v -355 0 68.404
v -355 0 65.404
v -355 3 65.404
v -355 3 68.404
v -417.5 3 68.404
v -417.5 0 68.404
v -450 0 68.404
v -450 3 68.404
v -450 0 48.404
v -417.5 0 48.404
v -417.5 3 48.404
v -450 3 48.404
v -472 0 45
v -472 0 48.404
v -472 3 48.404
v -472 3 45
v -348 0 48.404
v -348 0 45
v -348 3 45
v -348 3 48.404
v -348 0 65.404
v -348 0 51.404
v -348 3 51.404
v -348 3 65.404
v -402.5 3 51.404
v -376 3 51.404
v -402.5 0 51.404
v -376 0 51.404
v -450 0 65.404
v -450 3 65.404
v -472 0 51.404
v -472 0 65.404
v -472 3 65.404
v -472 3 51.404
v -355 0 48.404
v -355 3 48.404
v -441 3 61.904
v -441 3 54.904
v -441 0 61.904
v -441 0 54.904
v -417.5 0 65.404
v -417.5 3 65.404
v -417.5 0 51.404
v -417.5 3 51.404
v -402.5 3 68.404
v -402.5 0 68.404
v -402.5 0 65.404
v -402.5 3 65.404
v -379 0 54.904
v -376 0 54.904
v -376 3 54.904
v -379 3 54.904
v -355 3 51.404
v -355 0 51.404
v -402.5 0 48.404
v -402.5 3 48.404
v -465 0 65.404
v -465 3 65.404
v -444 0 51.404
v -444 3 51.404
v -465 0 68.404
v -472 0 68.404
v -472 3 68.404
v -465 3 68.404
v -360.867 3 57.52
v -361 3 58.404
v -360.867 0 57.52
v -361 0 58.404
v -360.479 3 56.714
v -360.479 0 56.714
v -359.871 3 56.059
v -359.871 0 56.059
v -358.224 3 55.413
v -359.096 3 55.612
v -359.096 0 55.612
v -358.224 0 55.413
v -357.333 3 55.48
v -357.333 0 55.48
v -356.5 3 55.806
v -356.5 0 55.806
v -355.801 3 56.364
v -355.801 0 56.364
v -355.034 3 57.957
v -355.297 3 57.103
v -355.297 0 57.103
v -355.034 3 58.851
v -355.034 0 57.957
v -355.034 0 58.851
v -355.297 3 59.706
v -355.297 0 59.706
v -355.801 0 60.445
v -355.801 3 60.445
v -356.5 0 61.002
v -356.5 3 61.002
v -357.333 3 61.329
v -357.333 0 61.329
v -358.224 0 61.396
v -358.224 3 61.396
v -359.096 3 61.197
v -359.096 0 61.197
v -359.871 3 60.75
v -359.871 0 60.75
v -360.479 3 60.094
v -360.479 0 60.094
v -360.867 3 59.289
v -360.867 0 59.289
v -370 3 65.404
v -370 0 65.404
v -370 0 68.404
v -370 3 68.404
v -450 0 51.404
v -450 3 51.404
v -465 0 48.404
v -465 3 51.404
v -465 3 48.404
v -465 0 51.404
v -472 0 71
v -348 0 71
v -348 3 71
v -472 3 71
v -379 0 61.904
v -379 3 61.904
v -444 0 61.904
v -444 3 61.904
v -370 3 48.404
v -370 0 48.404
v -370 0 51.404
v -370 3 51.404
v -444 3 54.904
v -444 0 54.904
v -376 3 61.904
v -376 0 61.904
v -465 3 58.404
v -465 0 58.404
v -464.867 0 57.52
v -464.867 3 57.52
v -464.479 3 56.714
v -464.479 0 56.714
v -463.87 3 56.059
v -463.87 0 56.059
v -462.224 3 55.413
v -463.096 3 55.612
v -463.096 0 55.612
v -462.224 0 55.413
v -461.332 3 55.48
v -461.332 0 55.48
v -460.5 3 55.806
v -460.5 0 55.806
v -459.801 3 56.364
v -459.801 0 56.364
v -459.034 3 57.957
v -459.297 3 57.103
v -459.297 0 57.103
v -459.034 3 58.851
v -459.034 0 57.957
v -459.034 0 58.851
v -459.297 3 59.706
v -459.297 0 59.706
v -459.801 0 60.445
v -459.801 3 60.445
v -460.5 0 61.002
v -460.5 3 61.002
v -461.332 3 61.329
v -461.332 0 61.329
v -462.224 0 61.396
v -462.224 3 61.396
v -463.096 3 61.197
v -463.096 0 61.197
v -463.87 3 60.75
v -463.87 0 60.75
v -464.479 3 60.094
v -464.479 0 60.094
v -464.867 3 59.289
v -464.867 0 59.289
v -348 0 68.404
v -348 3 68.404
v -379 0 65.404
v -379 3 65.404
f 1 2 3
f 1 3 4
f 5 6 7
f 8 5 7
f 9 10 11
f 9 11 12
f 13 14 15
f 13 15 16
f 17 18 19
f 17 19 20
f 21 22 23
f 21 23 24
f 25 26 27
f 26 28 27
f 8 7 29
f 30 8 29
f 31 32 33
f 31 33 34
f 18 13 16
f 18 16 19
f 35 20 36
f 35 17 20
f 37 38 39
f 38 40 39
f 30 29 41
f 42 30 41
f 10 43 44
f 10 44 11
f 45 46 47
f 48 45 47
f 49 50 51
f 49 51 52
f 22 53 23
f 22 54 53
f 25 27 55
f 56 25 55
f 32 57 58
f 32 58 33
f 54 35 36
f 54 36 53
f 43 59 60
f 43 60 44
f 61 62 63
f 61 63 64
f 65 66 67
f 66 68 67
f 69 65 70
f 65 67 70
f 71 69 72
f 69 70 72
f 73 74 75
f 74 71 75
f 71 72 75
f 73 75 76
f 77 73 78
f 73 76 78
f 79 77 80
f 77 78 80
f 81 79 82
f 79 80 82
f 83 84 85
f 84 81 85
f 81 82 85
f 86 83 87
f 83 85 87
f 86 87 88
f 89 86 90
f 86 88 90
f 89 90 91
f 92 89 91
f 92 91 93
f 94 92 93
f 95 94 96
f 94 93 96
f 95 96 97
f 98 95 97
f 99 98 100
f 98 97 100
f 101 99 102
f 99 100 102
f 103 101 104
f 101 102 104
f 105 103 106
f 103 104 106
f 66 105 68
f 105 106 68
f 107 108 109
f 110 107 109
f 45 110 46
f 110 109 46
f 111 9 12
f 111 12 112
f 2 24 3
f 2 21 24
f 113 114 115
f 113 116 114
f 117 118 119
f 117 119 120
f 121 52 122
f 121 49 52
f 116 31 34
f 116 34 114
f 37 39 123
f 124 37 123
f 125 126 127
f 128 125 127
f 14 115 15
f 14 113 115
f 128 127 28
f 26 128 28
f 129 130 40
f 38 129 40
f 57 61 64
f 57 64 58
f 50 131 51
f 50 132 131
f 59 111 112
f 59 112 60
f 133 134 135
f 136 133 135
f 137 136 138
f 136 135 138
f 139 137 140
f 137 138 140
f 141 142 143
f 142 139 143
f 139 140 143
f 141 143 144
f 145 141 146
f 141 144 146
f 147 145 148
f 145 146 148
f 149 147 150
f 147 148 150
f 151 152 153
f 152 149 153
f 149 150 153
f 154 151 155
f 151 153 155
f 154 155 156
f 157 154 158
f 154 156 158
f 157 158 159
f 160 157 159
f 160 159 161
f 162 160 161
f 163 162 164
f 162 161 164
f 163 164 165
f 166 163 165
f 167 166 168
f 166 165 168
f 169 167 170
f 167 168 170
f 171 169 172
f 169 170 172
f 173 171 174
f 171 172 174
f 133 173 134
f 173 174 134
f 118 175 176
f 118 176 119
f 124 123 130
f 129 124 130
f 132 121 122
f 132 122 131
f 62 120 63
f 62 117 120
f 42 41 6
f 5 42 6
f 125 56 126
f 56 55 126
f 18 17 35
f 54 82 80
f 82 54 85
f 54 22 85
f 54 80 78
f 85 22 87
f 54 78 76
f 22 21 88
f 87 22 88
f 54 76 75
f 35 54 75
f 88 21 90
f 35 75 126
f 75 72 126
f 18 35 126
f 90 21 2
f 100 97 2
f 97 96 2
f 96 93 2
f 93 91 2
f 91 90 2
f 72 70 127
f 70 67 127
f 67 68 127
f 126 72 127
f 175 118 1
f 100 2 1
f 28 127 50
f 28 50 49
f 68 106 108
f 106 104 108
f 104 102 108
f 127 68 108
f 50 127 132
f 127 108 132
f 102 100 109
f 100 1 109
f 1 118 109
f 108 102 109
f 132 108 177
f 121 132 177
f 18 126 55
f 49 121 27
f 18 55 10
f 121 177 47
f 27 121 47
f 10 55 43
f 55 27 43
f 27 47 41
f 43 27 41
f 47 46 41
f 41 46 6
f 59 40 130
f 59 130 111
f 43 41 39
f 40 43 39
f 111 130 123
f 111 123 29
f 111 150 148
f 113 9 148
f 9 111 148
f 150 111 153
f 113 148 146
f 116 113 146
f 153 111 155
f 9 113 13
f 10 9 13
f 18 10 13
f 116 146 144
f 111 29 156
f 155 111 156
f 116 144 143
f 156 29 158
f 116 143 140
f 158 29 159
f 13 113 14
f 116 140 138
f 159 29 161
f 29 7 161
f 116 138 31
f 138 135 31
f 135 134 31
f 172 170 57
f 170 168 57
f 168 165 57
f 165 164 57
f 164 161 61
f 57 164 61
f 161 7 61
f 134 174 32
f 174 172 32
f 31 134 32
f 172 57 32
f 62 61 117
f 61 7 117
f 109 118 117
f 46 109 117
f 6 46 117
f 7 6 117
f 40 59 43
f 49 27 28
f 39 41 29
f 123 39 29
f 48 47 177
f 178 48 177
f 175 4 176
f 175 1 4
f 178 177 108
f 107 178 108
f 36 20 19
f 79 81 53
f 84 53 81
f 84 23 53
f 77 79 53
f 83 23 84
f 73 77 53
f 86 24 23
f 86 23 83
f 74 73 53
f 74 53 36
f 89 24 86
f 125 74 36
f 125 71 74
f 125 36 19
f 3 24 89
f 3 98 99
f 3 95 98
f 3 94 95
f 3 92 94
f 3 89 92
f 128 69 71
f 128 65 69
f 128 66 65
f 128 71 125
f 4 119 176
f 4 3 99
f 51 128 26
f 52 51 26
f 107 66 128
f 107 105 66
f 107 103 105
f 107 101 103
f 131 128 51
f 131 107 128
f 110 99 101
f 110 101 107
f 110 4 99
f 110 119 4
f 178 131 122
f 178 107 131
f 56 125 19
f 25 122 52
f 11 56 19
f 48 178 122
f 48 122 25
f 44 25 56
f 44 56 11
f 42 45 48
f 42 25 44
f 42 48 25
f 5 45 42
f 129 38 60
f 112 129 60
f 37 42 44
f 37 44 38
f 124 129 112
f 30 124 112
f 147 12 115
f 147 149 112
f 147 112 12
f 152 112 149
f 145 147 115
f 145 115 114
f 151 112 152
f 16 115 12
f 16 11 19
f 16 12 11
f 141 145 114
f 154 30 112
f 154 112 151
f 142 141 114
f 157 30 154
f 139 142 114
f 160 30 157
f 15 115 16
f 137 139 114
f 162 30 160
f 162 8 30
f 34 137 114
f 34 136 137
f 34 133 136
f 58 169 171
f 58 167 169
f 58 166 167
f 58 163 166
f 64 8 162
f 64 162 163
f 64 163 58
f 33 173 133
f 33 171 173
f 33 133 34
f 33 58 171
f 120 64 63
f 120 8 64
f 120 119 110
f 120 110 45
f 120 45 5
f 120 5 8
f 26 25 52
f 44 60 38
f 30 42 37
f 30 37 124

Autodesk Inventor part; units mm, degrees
ref_plane "YZ Plane" through (0, 0, 0) normal (1, 0, 0) x (0, 1, 0)
ref_plane "XZ Plane" through (0, 0, 0) normal (0, 1, 0) x (-1, 0, 0)
ref_plane "XY Plane" through (0, 0, 0) normal (0, 0, 1) x (1, 0, 0)
sketch "Sketch2" plane through (0, 0, 0) normal (0, 1, 0) x (-1, 0, 0)
  line L0 (600, 68.7059) -> (634, 68.7059)
  arc A0 (642, 60.7059) -> (634, 68.7059) centre (634, 60.7059) ccw
  line L1 (642, 60.7059) -> (642, 56.7059)
  arc A1 (634, 48.7059) -> (642, 56.7059) centre (634, 56.7059) ccw
  line L2 (634, 48.7059) -> (632, 48.7059)
  arc A2 (632, 48.7059) -> (624, 40.7059) centre (632, 40.7059) ccw
  line L3 (624, 40.7059) -> (624, 36.7059)
  arc A3 (624, 36.7059) -> (632, 28.7059) centre (632, 36.7059) ccw
  line L4 (632, 28.7059) -> (634, 28.7059)
  arc A4 (642, 20.7059) -> (634, 28.7059) centre (634, 20.7059) ccw
  line L5 (642, 20.7059) -> (642, 16.7059)
  arc A5 (634, 8.7059) -> (642, 16.7059) centre (634, 16.7059) ccw
  line L6 (634, 8.7059) -> (600, 8.7059)
  arc A6 (592, 16.7059) -> (600, 8.7059) centre (600, 16.7059) ccw
  line L7 (592, 16.7059) -> (592, 21.7059)
  line L8 (592, 21.7059) -> (606.1716, 35.8774)
  arc A7 (606.1716, 35.8774) -> (606.1716, 41.5343) centre (603.3431, 38.7059) ccw
  line L9 (606.1716, -97.5343) -> (592, -111.7059)
  line L10 (592, -111.7059) -> (592, -116.7059)
  arc A8 (592, -116.7059) -> (600, -124.7059) centre (600, -116.7059) ccw
  line L11 (600, -124.7059) -> (634, -124.7059)
  arc A9 (634, -124.7059) -> (642, -116.7059) centre (634, -116.7059) ccw
  line L12 (642, -116.7059) -> (642, -112.7059)
  arc A10 (642, -112.7059) -> (634, -104.7059) centre (634, -112.7059) ccw
  line L13 (634, -104.7059) -> (632, -104.7059)
  arc A11 (624, -96.7059) -> (632, -104.7059) centre (632, -96.7059) ccw
  line L14 (624, -96.7059) -> (624, -92.7059)
  arc A12 (632, -84.7059) -> (624, -92.7059) centre (632, -92.7059) ccw
  line L15 (632, -84.7059) -> (634, -84.7059)
  arc A13 (634, -84.7059) -> (642, -76.7059) centre (634, -76.7059) ccw
  line L16 (642, -76.7059) -> (642, -72.7059)
  arc A14 (642, -72.7059) -> (634, -64.7059) centre (634, -72.7059) ccw
  line L17 (634, -64.7059) -> (600, -64.7059)
  arc A15 (600, -64.7059) -> (592, -72.7059) centre (600, -72.7059) ccw
  line L18 (592, -72.7059) -> (592, -77.7059)
  line L19 (592, -77.7059) -> (606.1716, -91.8774)
  arc A16 (606.1716, -97.5343) -> (606.1716, -91.8774) centre (603.3431, -94.7059) ccw
  circle A17 centre (618, -74.7059) radius 3
  circle A18 centre (634, -74.7059) radius 3
  circle A19 centre (634, -114.7059) radius 3
  circle A20 centre (618, -114.7059) radius 3
  circle A21 centre (618, 58.7059) radius 3
  circle A22 centre (634, 58.7059) radius 3
  circle A23 centre (634, 18.7059) radius 3
  circle A24 centre (618, 18.7059) radius 3
  line L20 (606.1716, 41.5343) -> (592, 55.7059)
  line L21 (592, 55.7059) -> (592, 60.7059)
  arc A25 (600, 68.7059) -> (592, 60.7059) centre (600, 60.7059) ccw
  line L22 (329, -137) -> (729, -137)
  line L23 (729, -137) -> (729, 83)
  line L24 (729, 83) -> (329, 83)
  line L25 (329, 83) -> (329, -137)
  line L26 (444, -107.4043) -> (417.5, -107.4043)
  line L27 (417.5, -107.4043) -> (417.5, -104.4043)
  line L28 (417.5, -104.4043) -> (450, -104.4043)
  line L29 (450, -104.4043) -> (450, -107.4043)
  line L30 (450, -107.4043) -> (444, -107.4043)
  line L31 (441, -117.9043) -> (444, -117.9043)
  line L32 (444, -117.9043) -> (444, -110.9043)
  line L33 (444, -110.9043) -> (441, -110.9043)
  line L34 (441, -110.9043) -> (441, -117.9043)
  line L35 (417.5, -121.4043) -> (417.5, -124.4043)
  line L36 (417.5, -124.4043) -> (450, -124.4043)
  line L37 (450, -124.4043) -> (450, -121.4043)
  line L38 (450, -121.4043) -> (417.5, -121.4043)
  line L39 (376.0002, -107.4043) -> (402.5, -107.4043)
  line L40 (402.5, -107.4043) -> (402.5, -104.4043)
  line L41 (402.5, -104.4043) -> (370, -104.4043)
  line L42 (370, -104.4043) -> (370, -107.4043)
  line L43 (370, -107.4043) -> (376.0002, -107.4043)
  line L44 (379.0002, -121.4043) -> (370, -121.4043)
  line L45 (370, -121.4043) -> (370, -124.4043)
  line L46 (370, -124.4043) -> (402.5, -124.4043)
  line L47 (402.5, -124.4043) -> (402.5, -121.4043)
  line L48 (402.5, -121.4043) -> (379.0002, -121.4043)
  line L49 (379.0002, -117.9043) -> (376.0002, -117.9043)
  line L50 (376.0002, -117.9043) -> (376.0002, -110.9043)
  line L51 (376.0002, -110.9043) -> (379.0002, -110.9043)
  line L52 (379.0002, -110.9043) -> (379.0002, -117.9043)
  line L53 (348, -127) -> (472.0002, -127)
  line L54 (472.0002, -127) -> (472.0002, -124.4043)
  line L55 (472.0002, -124.4043) -> (465, -124.4043)
  line L56 (465, -124.4043) -> (465, -121.4043)
  line L57 (465, -121.4043) -> (472.0002, -121.4043)
  line L58 (472.0002, -121.4043) -> (472.0002, -107.4043)
  line L59 (472.0002, -107.4043) -> (465, -107.4043)
  line L60 (465, -107.4043) -> (465, -104.4043)
  line L61 (465, -104.4043) -> (472.0002, -104.4043)
  line L62 (472.0002, -104.4043) -> (472.0002, -101)
  line L63 (472.0002, -101) -> (348, -101)
  line L64 (348, -101) -> (348, -104.4043)
  line L65 (348, -104.4043) -> (355, -104.4043)
  line L66 (355, -104.4043) -> (355, -107.4043)
  line L67 (355, -107.4043) -> (348, -107.4043)
  line L68 (348, -107.4043) -> (348, -121.4043)
  line L69 (348, -121.4043) -> (355, -121.4043)
  line L70 (355, -121.4043) -> (355, -124.4043)
  line L71 (355, -124.4043) -> (348, -124.4043)
  line L72 (348, -124.4043) -> (348, -127)
  circle A26 centre (447.7252, -37.7011) radius 3
  circle A27 centre (372.2748, -37.7011) radius 3
  circle A28 centre (410, -64.4043) radius 3
  circle A29 centre (448.5, -66.4043) radius 3
  circle A30 centre (371.5, -66.4043) radius 3
  circle A31 centre (410, -80.4043) radius 3
  line L73 (379, -84.4043) -> (376, -84.4043)
  line L74 (376, -84.4043) -> (376, -74.4043)
  line L75 (376, -74.4043) -> (379, -74.4043)
  line L76 (379, -74.4043) -> (379, -84.4043)
  line L77 (379, -57.4043) -> (376, -57.4043)
  line L78 (376, -57.4043) -> (376, -47.4043)
  line L79 (376, -47.4043) -> (379, -47.4043)
  line L80 (379, -47.4043) -> (379, -57.4043)
  line L81 (441, -47.4043) -> (441, -57.4043)
  line L82 (441, -57.4043) -> (444, -57.4043)
  line L83 (444, -57.4043) -> (444, -47.4043)
  line L84 (444, -47.4043) -> (441, -47.4043)
  line L85 (441, -74.4043) -> (441, -84.4043)
  line L86 (441, -84.4043) -> (444, -84.4043)
  line L87 (444, -84.4043) -> (444, -74.4043)
  line L88 (444, -74.4043) -> (441, -74.4043)
  line L89 (427, -44.4043) -> (427, -72.4043)
  arc A32 (427, -72.4043) -> (433, -72.4043) centre (430, -72.4043) ccw
  line L90 (433, -72.4043) -> (433, -44.4043)
  arc A33 (433, -44.4043) -> (427, -44.4043) centre (430, -44.4043) ccw
  arc A34 (387, -72.4043) -> (393, -72.4043) centre (390, -72.4043) ccw
  line L91 (393, -72.4043) -> (393, -44.4043)
  arc A35 (393, -44.4043) -> (387, -44.4043) centre (390, -44.4043) ccw
  line L92 (387, -44.4043) -> (387, -72.4043)
  line L93 (372.3983, -27.7019) -> (383.2576, -27.7018)
  arc A36 (390.8984, -33.3311) -> (383.2576, -27.7018) centre (383.2577, -35.7018) ccw
  arc A37 (390.8984, -33.3311) -> (429.1018, -33.3307) centre (410, -27.4043) ccw
  arc A38 (436.7424, -27.7012) -> (429.1018, -33.3307) centre (436.7425, -35.7012) ccw
  line L94 (436.7424, -27.7012) -> (447.7251, -27.7011)
  arc A39 (457.0715, -34.1449) -> (447.7251, -27.7011) centre (447.7252, -37.7011) ccw
  line L95 (457.0715, -34.1449) -> (477.9368, -88.9818)
  arc A40 (474.1982, -94.4043) -> (477.9368, -88.9818) centre (474.1982, -90.4043) ccw
  line L96 (474.1982, -94.4043) -> (465, -94.4043)
  line L97 (465, -94.4043) -> (465, -91.4043)
  line L98 (465, -91.4043) -> (450, -91.4043)
  line L99 (450, -91.4043) -> (450, -94.4043)
  line L100 (450, -94.4043) -> (417.5, -94.4043)
  line L101 (417.5, -94.4043) -> (417.5, -91.4043)
  line L102 (417.5, -91.4043) -> (402.5, -91.4043)
  line L103 (402.5, -91.4043) -> (402.5, -94.4043)
  line L104 (402.5, -94.4043) -> (370, -94.4043)
  line L105 (370, -94.4043) -> (370, -91.4043)
  line L106 (370, -91.4043) -> (355, -91.4043)
  line L107 (355, -91.4043) -> (355, -94.4043)
  line L108 (355, -94.4043) -> (345.8018, -94.4043)
  arc A41 (342.0632, -88.9818) -> (345.8018, -94.4043) centre (345.8018, -90.4043) ccw
  line L109 (342.0632, -88.9818) -> (362.9285, -34.1449)
  arc A42 (372.3983, -27.7019) -> (362.9285, -34.1449) centre (372.2748, -37.7011) ccw
  line L110 (491.3983, -95.7004) -> (502.2576, -95.7005)
  arc A43 (502.2576, -95.7005) -> (509.8984, -90.0712) centre (502.2577, -87.7005) ccw
  arc A44 (548.1018, -90.0716) -> (509.8984, -90.0712) centre (529, -95.998) ccw
  arc A45 (548.1018, -90.0716) -> (555.7424, -95.701) centre (555.7425, -87.701) ccw
  line L111 (555.7424, -95.701) -> (566.7251, -95.7011)
  arc A46 (566.7251, -95.7011) -> (576.0715, -89.2574) centre (566.7252, -85.7011) ccw
  line L112 (576.0715, -89.2574) -> (596.9368, -34.4205)
  arc A47 (596.9368, -34.4205) -> (593.1982, -28.998) centre (593.1982, -32.998) ccw
  line L113 (593.1982, -28.998) -> (584, -28.998)
  line L114 (584, -28.998) -> (584, -31.998)
  line L115 (584, -31.998) -> (569, -31.998)
  line L116 (569, -31.998) -> (569, -28.998)
  line L117 (569, -28.998) -> (536.5, -28.998)
  line L118 (536.5, -28.998) -> (536.5, -31.998)
  line L119 (536.5, -31.998) -> (521.5, -31.998)
  line L120 (521.5, -31.998) -> (521.5, -28.998)
  line L121 (521.5, -28.998) -> (489, -28.998)
  line L122 (489, -28.998) -> (489, -31.998)
  line L123 (489, -31.998) -> (474, -31.998)
  line L124 (474, -31.998) -> (474, -28.998)
  line L125 (474, -28.998) -> (464.8018, -28.998)
  arc A48 (464.8018, -28.998) -> (461.0632, -34.4205) centre (464.8018, -32.998) ccw
  line L126 (461.0632, -34.4205) -> (481.9285, -89.2574)
  arc A49 (481.9285, -89.2574) -> (491.3983, -95.7004) centre (491.2748, -85.7011) ccw
  arc A50 (512, -50.998) -> (506, -50.998) centre (509, -50.998) ccw
  line L127 (512, -50.998) -> (512, -78.998)
  arc A51 (506, -78.998) -> (512, -78.998) centre (509, -78.998) ccw
  line L128 (506, -78.998) -> (506, -50.998)
  line L129 (546, -78.998) -> (546, -50.998)
  arc A52 (552, -50.998) -> (546, -50.998) centre (549, -50.998) ccw
  line L130 (552, -50.998) -> (552, -78.998)
  arc A53 (546, -78.998) -> (552, -78.998) centre (549, -78.998) ccw
  line L131 (560, -48.998) -> (560, -38.998)
  line L132 (560, -38.998) -> (563, -38.998)
  line L133 (563, -38.998) -> (563, -48.998)
  line L134 (563, -48.998) -> (560, -48.998)
  line L135 (560, -75.998) -> (560, -65.998)
  line L136 (560, -65.998) -> (563, -65.998)
  line L137 (563, -65.998) -> (563, -75.998)
  line L138 (563, -75.998) -> (560, -75.998)
  line L139 (498, -65.998) -> (495, -65.998)
  line L140 (495, -65.998) -> (495, -75.998)
  line L141 (495, -75.998) -> (498, -75.998)
  line L142 (498, -75.998) -> (498, -65.998)
  line L143 (498, -38.998) -> (495, -38.998)
  line L144 (495, -38.998) -> (495, -48.998)
  line L145 (495, -48.998) -> (498, -48.998)
  line L146 (498, -48.998) -> (498, -38.998)
  circle A54 centre (529, -42.998) radius 3
  circle A55 centre (490.5, -56.998) radius 3
  circle A56 centre (567.5, -56.998) radius 3
  circle A57 centre (529, -58.998) radius 3
  circle A58 centre (491.2748, -85.7011) radius 3
  circle A59 centre (566.7252, -85.7011) radius 3
  circle A60 centre (462, -114.4043) radius 3
  circle A61 centre (358.0002, -114.4043) radius 3
  line L147 (578, -104.4043) -> (578, -107.4043)
  line L148 (578, -107.4043) -> (585, -107.4043)
  line L149 (585, -107.4043) -> (585, -110.9043)
  line L150 (585, -110.9043) -> (588, -110.9043)
  line L151 (588, -110.9043) -> (588, -117.9043)
  line L152 (588, -117.9043) -> (585, -117.9043)
  line L153 (585, -117.9043) -> (585, -121.4043)
  line L154 (585, -121.4043) -> (578, -121.4043)
  line L155 (578, -121.4043) -> (578, -124.4043)
  line L156 (578, -124.4043) -> (568, -124.4043)
  line L157 (568, -124.4043) -> (568, -121.4043)
  line L158 (568, -121.4043) -> (551, -121.4043)
  line L159 (551, -121.4043) -> (551, -124.4043)
  line L160 (551, -124.4043) -> (541, -124.4043)
  line L161 (541, -124.4043) -> (541, -121.4043)
  line L162 (541, -121.4043) -> (535, -121.4043)
  line L163 (535, -121.4043) -> (535, -107.4043)
  line L164 (535, -107.4043) -> (541, -107.4043)
  line L165 (541, -107.4043) -> (541, -104.4043)
  line L166 (541, -104.4043) -> (551, -104.4043)
  line L167 (551, -104.4043) -> (551, -107.4043)
  line L168 (551, -107.4043) -> (568, -107.4043)
  line L169 (568, -107.4043) -> (568, -104.4043)
  line L170 (568, -104.4043) -> (578, -104.4043)
  line L171 (520, -104.4043) -> (520, -107.4043)
  line L172 (520, -107.4043) -> (527, -107.4043)
  line L173 (527, -107.4043) -> (527, -110.9043)
  line L174 (527, -110.9043) -> (530, -110.9043)
  line L175 (530, -110.9043) -> (530, -117.9043)
  line L176 (530, -117.9043) -> (527, -117.9043)
  line L177 (527, -117.9043) -> (527, -121.4043)
  line L178 (527, -121.4043) -> (520, -121.4043)
  line L179 (520, -121.4043) -> (520, -124.4043)
  line L180 (520, -124.4043) -> (510, -124.4043)
  line L181 (510, -124.4043) -> (510, -121.4043)
  line L182 (510, -121.4043) -> (493, -121.4043)
  line L183 (493, -121.4043) -> (493, -124.4043)
  line L184 (493, -124.4043) -> (483, -124.4043)
  line L185 (483, -124.4043) -> (483, -121.4043)
  line L186 (483, -121.4043) -> (477, -121.4043)
  line L187 (477, -121.4043) -> (477, -107.4043)
  line L188 (477, -107.4043) -> (483, -107.4043)
  line L189 (483, -107.4043) -> (483, -104.4043)
  line L190 (483, -104.4043) -> (493, -104.4043)
  line L191 (493, -104.4043) -> (493, -107.4043)
  line L192 (493, -107.4043) -> (510, -107.4043)
  line L193 (510, -107.4043) -> (510, -104.4043)
  line L194 (510, -104.4043) -> (520, -104.4043)
  line L195 (520, 48.4043) -> (520, 51.4043)
  line L196 (520, 51.4043) -> (527, 51.4043)
  line L197 (527, 51.4043) -> (527, 54.9043)
  line L198 (527, 54.9043) -> (530, 54.9043)
  line L199 (530, 54.9043) -> (530, 61.9043)
  line L200 (530, 61.9043) -> (527, 61.9043)
  line L201 (527, 61.9043) -> (527, 65.4043)
  line L202 (527, 65.4043) -> (520, 65.4043)
  line L203 (520, 65.4043) -> (520, 68.4043)
  line L204 (520, 68.4043) -> (510, 68.4043)
  line L205 (510, 68.4043) -> (510, 65.4043)
  line L206 (510, 65.4043) -> (493, 65.4043)
  line L207 (493, 65.4043) -> (493, 68.4043)
  line L208 (493, 68.4043) -> (483, 68.4043)
  line L209 (483, 68.4043) -> (483, 65.4043)
  line L210 (483, 65.4043) -> (477, 65.4043)
  line L211 (477, 65.4043) -> (477, 51.4043)
  line L212 (477, 51.4043) -> (483, 51.4043)
  line L213 (483, 51.4043) -> (483, 48.4043)
  line L214 (483, 48.4043) -> (493, 48.4043)
  line L215 (493, 48.4043) -> (493, 51.4043)
  line L216 (493, 51.4043) -> (510, 51.4043)
  line L217 (510, 51.4043) -> (510, 48.4043)
  line L218 (510, 48.4043) -> (520, 48.4043)
  line L219 (578, 48.4043) -> (578, 51.4043)
  line L220 (578, 51.4043) -> (585, 51.4043)
  line L221 (585, 51.4043) -> (585, 54.9043)
  line L222 (585, 54.9043) -> (588, 54.9043)
  line L223 (588, 54.9043) -> (588, 61.9043)
  line L224 (588, 61.9043) -> (585, 61.9043)
  line L225 (585, 61.9043) -> (585, 65.4043)
  line L226 (585, 65.4043) -> (578, 65.4043)
  line L227 (578, 65.4043) -> (578, 68.4043)
  line L228 (578, 68.4043) -> (568, 68.4043)
  line L229 (568, 68.4043) -> (568, 65.4043)
  line L230 (568, 65.4043) -> (551, 65.4043)
  line L231 (551, 65.4043) -> (551, 68.4043)
  line L232 (551, 68.4043) -> (541, 68.4043)
  line L233 (541, 68.4043) -> (541, 65.4043)
  line L234 (541, 65.4043) -> (535, 65.4043)
  line L235 (535, 65.4043) -> (535, 51.4043)
  line L236 (535, 51.4043) -> (541, 51.4043)
  line L237 (541, 51.4043) -> (541, 48.4043)
  line L238 (541, 48.4043) -> (551, 48.4043)
  line L239 (551, 48.4043) -> (551, 51.4043)
  line L240 (551, 51.4043) -> (568, 51.4043)
  line L241 (568, 51.4043) -> (568, 48.4043)
  line L242 (568, 48.4043) -> (578, 48.4043)
  circle A62 centre (358.0002, 58.4043) radius 3
  circle A63 centre (462, 58.4043) radius 3
  circle A64 centre (566.7252, 29.7011) radius 3
  circle A65 centre (491.2748, 29.7011) radius 3
  circle A66 centre (529, 2.998) radius 3
  circle A67 centre (567.5, 0.998) radius 3
  circle A68 centre (490.5, 0.998) radius 3
  circle A69 centre (529, -13.002) radius 3
  line L243 (498, -17.002) -> (495, -17.002)
  line L244 (495, -17.002) -> (495, -7.002)
  line L245 (495, -7.002) -> (498, -7.002)
  line L246 (498, -7.002) -> (498, -17.002)
  line L247 (498, 9.998) -> (495, 9.998)
  line L248 (495, 9.998) -> (495, 19.998)
  line L249 (495, 19.998) -> (498, 19.998)
  line L250 (498, 19.998) -> (498, 9.998)
  line L251 (560, 19.998) -> (560, 9.998)
  line L252 (560, 9.998) -> (563, 9.998)
  line L253 (563, 9.998) -> (563, 19.998)
  line L254 (563, 19.998) -> (560, 19.998)
  line L255 (560, -7.002) -> (560, -17.002)
  line L256 (560, -17.002) -> (563, -17.002)
  line L257 (563, -17.002) -> (563, -7.002)
  line L258 (563, -7.002) -> (560, -7.002)
  line L259 (546, 22.998) -> (546, -5.002)
  arc A70 (546, -5.002) -> (552, -5.002) centre (549, -5.002) ccw
  line L260 (552, -5.002) -> (552, 22.998)
  arc A71 (552, 22.998) -> (546, 22.998) centre (549, 22.998) ccw
  arc A72 (506, -5.002) -> (512, -5.002) centre (509, -5.002) ccw
  line L261 (512, -5.002) -> (512, 22.998)
  arc A73 (512, 22.998) -> (506, 22.998) centre (509, 22.998) ccw
  line L262 (506, 22.998) -> (506, -5.002)
  line L263 (491.3983, 39.7004) -> (502.2576, 39.7005)
  arc A74 (509.8984, 34.0712) -> (502.2576, 39.7005) centre (502.2577, 31.7005) ccw
  arc A75 (509.8984, 34.0712) -> (548.1018, 34.0716) centre (529, 39.998) ccw
  arc A76 (555.7424, 39.701) -> (548.1018, 34.0716) centre (555.7425, 31.701) ccw
  line L264 (555.7424, 39.701) -> (566.7251, 39.7011)
  arc A77 (576.0715, 33.2574) -> (566.7251, 39.7011) centre (566.7252, 29.7011) ccw
  line L265 (576.0715, 33.2574) -> (596.9368, -21.5795)
  arc A78 (593.1982, -27.002) -> (596.9368, -21.5795) centre (593.1982, -23.002) ccw
  line L266 (593.1982, -27.002) -> (584, -27.002)
  line L267 (584, -27.002) -> (584, -24.002)
  line L268 (584, -24.002) -> (569, -24.002)
  line L269 (569, -24.002) -> (569, -27.002)
  line L270 (569, -27.002) -> (536.5, -27.002)
  line L271 (536.5, -27.002) -> (536.5, -24.002)
  line L272 (536.5, -24.002) -> (521.5, -24.002)
  line L273 (521.5, -24.002) -> (521.5, -27.002)
  line L274 (521.5, -27.002) -> (489, -27.002)
  line L275 (489, -27.002) -> (489, -24.002)
  line L276 (489, -24.002) -> (474, -24.002)
  line L277 (474, -24.002) -> (474, -27.002)
  line L278 (474, -27.002) -> (464.8018, -27.002)
  arc A79 (461.0632, -21.5795) -> (464.8018, -27.002) centre (464.8018, -23.002) ccw
  line L279 (461.0632, -21.5795) -> (481.9285, 33.2574)
  arc A80 (491.3983, 39.7004) -> (481.9285, 33.2574) centre (491.2748, 29.7011) ccw
  line L280 (372.3983, -28.2981) -> (383.2576, -28.2982)
  arc A81 (383.2576, -28.2982) -> (390.8984, -22.6689) centre (383.2577, -20.2982) ccw
  arc A82 (429.1018, -22.6693) -> (390.8984, -22.6689) centre (410, -28.5957) ccw
  arc A83 (429.1018, -22.6693) -> (436.7424, -28.2988) centre (436.7425, -20.2988) ccw
  line L281 (436.7424, -28.2988) -> (447.7251, -28.2989)
  arc A84 (447.7251, -28.2989) -> (457.0715, -21.8551) centre (447.7252, -18.2989) ccw
  line L282 (457.0715, -21.8551) -> (477.9368, 32.9818)
  arc A85 (477.9368, 32.9818) -> (474.1982, 38.4043) centre (474.1982, 34.4043) ccw
  line L283 (474.1982, 38.4043) -> (465, 38.4043)
  line L284 (465, 38.4043) -> (465, 35.4043)
  line L285 (465, 35.4043) -> (450, 35.4043)
  line L286 (450, 35.4043) -> (450, 38.4043)
  line L287 (450, 38.4043) -> (417.5, 38.4043)
  line L288 (417.5, 38.4043) -> (417.5, 35.4043)
  line L289 (417.5, 35.4043) -> (402.5, 35.4043)
  line L290 (402.5, 35.4043) -> (402.5, 38.4043)
  line L291 (402.5, 38.4043) -> (370, 38.4043)
  line L292 (370, 38.4043) -> (370, 35.4043)
  line L293 (370, 35.4043) -> (355, 35.4043)
  line L294 (355, 35.4043) -> (355, 38.4043)
  line L295 (355, 38.4043) -> (345.8018, 38.4043)
  arc A86 (345.8018, 38.4043) -> (342.0632, 32.9818) centre (345.8018, 34.4043) ccw
  line L296 (342.0632, 32.9818) -> (362.9285, -21.8551)
  arc A87 (362.9285, -21.8551) -> (372.3983, -28.2981) centre (372.2748, -18.2989) ccw
  arc A88 (393, 16.4043) -> (387, 16.4043) centre (390, 16.4043) ccw
  line L297 (393, 16.4043) -> (393, -11.5957)
  arc A89 (387, -11.5957) -> (393, -11.5957) centre (390, -11.5957) ccw
  line L298 (387, -11.5957) -> (387, 16.4043)
  line L299 (427, -11.5957) -> (427, 16.4043)
  arc A90 (433, 16.4043) -> (427, 16.4043) centre (430, 16.4043) ccw
  line L300 (433, 16.4043) -> (433, -11.5957)
  arc A91 (427, -11.5957) -> (433, -11.5957) centre (430, -11.5957) ccw
  line L301 (441, 18.4043) -> (441, 28.4043)
  line L302 (441, 28.4043) -> (444, 28.4043)
  line L303 (444, 28.4043) -> (444, 18.4043)
  line L304 (444, 18.4043) -> (441, 18.4043)
  line L305 (441, -8.5957) -> (441, 1.4043)
  line L306 (441, 1.4043) -> (444, 1.4043)
  line L307 (444, 1.4043) -> (444, -8.5957)
  line L308 (444, -8.5957) -> (441, -8.5957)
  line L309 (379, 1.4043) -> (376, 1.4043)
  line L310 (376, 1.4043) -> (376, -8.5957)
  line L311 (376, -8.5957) -> (379, -8.5957)
  line L312 (379, -8.5957) -> (379, 1.4043)
  line L313 (379, 28.4043) -> (376, 28.4043)
  line L314 (376, 28.4043) -> (376, 18.4043)
  line L315 (376, 18.4043) -> (379, 18.4043)
  line L316 (379, 18.4043) -> (379, 28.4043)
  circle A92 centre (410, 24.4043) radius 3
  circle A93 centre (371.5, 10.4043) radius 3
  circle A94 centre (448.5, 10.4043) radius 3
  circle A95 centre (410, 8.4043) radius 3
  circle A96 centre (372.2748, -18.2989) radius 3
  circle A97 centre (447.7252, -18.2989) radius 3
  line L317 (348, 71) -> (472.0002, 71)
  line L318 (472.0002, 71) -> (472.0002, 68.4043)
  line L319 (472.0002, 68.4043) -> (465, 68.4043)
  line L320 (465, 68.4043) -> (465, 65.4043)
  line L321 (465, 65.4043) -> (472.0002, 65.4043)
  line L322 (472.0002, 65.4043) -> (472.0002, 51.4043)
  line L323 (472.0002, 51.4043) -> (465, 51.4043)
  line L324 (465, 51.4043) -> (465, 48.4043)
  line L325 (465, 48.4043) -> (472.0002, 48.4043)
  line L326 (472.0002, 48.4043) -> (472.0002, 45)
  line L327 (472.0002, 45) -> (348, 45)
  line L328 (348, 45) -> (348, 48.4043)
  line L329 (348, 48.4043) -> (355, 48.4043)
  line L330 (355, 48.4043) -> (355, 51.4043)
  line L331 (355, 51.4043) -> (348, 51.4043)
  line L332 (348, 51.4043) -> (348, 65.4043)
  line L333 (348, 65.4043) -> (355, 65.4043)
  line L334 (355, 65.4043) -> (355, 68.4043)
  line L335 (355, 68.4043) -> (348, 68.4043)
  line L336 (348, 68.4043) -> (348, 71)
  line L337 (379.0002, 61.9043) -> (376.0002, 61.9043)
  line L338 (376.0002, 61.9043) -> (376.0002, 54.9043)
  line L339 (376.0002, 54.9043) -> (379.0002, 54.9043)
  line L340 (379.0002, 54.9043) -> (379.0002, 61.9043)
  line L341 (379.0002, 65.4043) -> (370, 65.4043)
  line L342 (370, 65.4043) -> (370, 68.4043)
  line L343 (370, 68.4043) -> (402.5, 68.4043)
  line L344 (402.5, 68.4043) -> (402.5, 65.4043)
  line L345 (402.5, 65.4043) -> (379.0002, 65.4043)
  line L346 (376.0002, 51.4043) -> (402.5, 51.4043)
  line L347 (402.5, 51.4043) -> (402.5, 48.4043)
  line L348 (402.5, 48.4043) -> (370, 48.4043)
  line L349 (370, 48.4043) -> (370, 51.4043)
  line L350 (370, 51.4043) -> (376.0002, 51.4043)
  line L351 (417.5, 65.4043) -> (417.5, 68.4043)
  line L352 (417.5, 68.4043) -> (450, 68.4043)
  line L353 (450, 68.4043) -> (450, 65.4043)
  line L354 (450, 65.4043) -> (417.5, 65.4043)
  line L355 (441, 61.9043) -> (444, 61.9043)
  line L356 (444, 61.9043) -> (444, 54.9043)
  line L357 (444, 54.9043) -> (441, 54.9043)
  line L358 (441, 54.9043) -> (441, 61.9043)
  line L359 (444, 51.4043) -> (417.5, 51.4043)
  line L360 (417.5, 51.4043) -> (417.5, 48.4043)
  line L361 (417.5, 48.4043) -> (450, 48.4043)
  line L362 (450, 48.4043) -> (450, 51.4043)
  line L363 (450, 51.4043) -> (444, 51.4043)
  line L364 (672, -101.5) -> (672, -103)
  line L365 (672, -103) -> (695, -103)
  line L366 (695, -103) -> (695, -107.1363)
  arc A98 (692.2891, -110.9229) -> (695, -107.1363) centre (691, -107.1363) ccw
  line L367 (692.2891, -110.9229) -> (650.6445, -125.0997)
  arc A99 (648, -123.2064) -> (650.6445, -125.0997) centre (650, -123.2064) ccw
  line L368 (648, -123.2064) -> (648, -115)
  line L369 (648, -115) -> (649, -115)
  arc A100 (649, -115) -> (651, -113) centre (649, -113) ccw
  line L370 (651, -113) -> (651, -90)
  arc A101 (651, -90) -> (649, -88) centre (649, -90) ccw
  line L371 (649, -88) -> (648, -88)
  line L372 (648, -88) -> (648, -79.7936)
  arc A102 (650.6445, -77.9003) -> (648, -79.7936) centre (650, -79.7936) ccw
  line L373 (650.6445, -77.9003) -> (692.2891, -92.0771)
  arc A103 (695, -95.8637) -> (692.2891, -92.0771) centre (691, -95.8637) ccw
  line L374 (695, -95.8637) -> (695, -100)
  line L375 (695, -100) -> (672, -100)
  line L376 (672, -100) -> (672, -101.5)
  line L377 (671, 47.5) -> (671, 46)
  line L378 (671, 46) -> (694, 46)
  line L379 (694, 46) -> (694, 41.8637)
  arc A104 (691.2891, 38.0771) -> (694, 41.8637) centre (690, 41.8637) ccw
  line L380 (691.2891, 38.0771) -> (649.6445, 23.9003)
  arc A105 (647, 25.7936) -> (649.6445, 23.9003) centre (649, 25.7936) ccw
  line L381 (647, 25.7936) -> (647, 34)
  line L382 (647, 34) -> (648, 34)
  arc A106 (648, 34) -> (650, 36) centre (648, 36) ccw
  line L383 (650, 36) -> (650, 59)
  arc A107 (650, 59) -> (648, 61) centre (648, 59) ccw
  line L384 (648, 61) -> (647, 61)
  line L385 (647, 61) -> (647, 69.2064)
  arc A108 (649.6445, 71.0997) -> (647, 69.2064) centre (649, 69.2064) ccw
  line L386 (649.6445, 71.0997) -> (691.2891, 56.9229)
  arc A109 (694, 53.1363) -> (691.2891, 56.9229) centre (690, 53.1363) ccw
  line L387 (694, 53.1363) -> (694, 49)
  line L388 (694, 49) -> (671, 49)
  line L389 (671, 49) -> (671, 47.5)
  line L390 (692.5332, 13) -> (713, 13)
  line L391 (713, 13) -> (713, 28)
  line L392 (713, 28) -> (716, 28)
  line L393 (716, 28) -> (716, 37.1982)
  arc A110 (716, 37.1982) -> (710.5775, 40.9368) centre (712, 37.1982) ccw
  line L394 (710.5775, 40.9368) -> (655.7406, 20.0715)
  arc A111 (655.7406, 20.0715) -> (649.7575, 13.7252) centre (659.2969, 10.7252) ccw
  line L395 (649.7575, 13.7252) -> (659.2969, 13.7252)
  arc A112 (659.2969, 7.7252) -> (659.2969, 13.7252) centre (659.2969, 10.7252) ccw
  line L396 (659.2969, 7.7252) -> (649.2969, 7.7252)
  line L397 (649.2969, 7.7252) -> (649.2963, 1.7997)
  arc A113 (677.6446, -24) -> (649.2963, 1.7997) centre (649, -27) ccw
  line L398 (677.6446, -24) -> (686, -24)
  arc A114 (686.0452, -29.9997) -> (686, -24) centre (686, -27) ccw
  line L399 (686.0452, -29.9997) -> (677.6446, -29.9997)
  arc A115 (649.2975, -55.7997) -> (677.6446, -29.9997) centre (649, -27) ccw
  line L400 (649.2975, -55.7997) -> (649.2976, -61.7252)
  line L401 (649.2976, -61.7252) -> (659.2969, -61.7252)
  arc A116 (659.2969, -67.7252) -> (659.2969, -61.7252) centre (659.2969, -64.7252) ccw
  line L402 (659.2969, -67.7252) -> (649.7575, -67.7252)
  arc A117 (649.7575, -67.7252) -> (655.7406, -74.0715) centre (659.2969, -64.7252) ccw
  line L403 (655.7406, -74.0715) -> (710.5775, -94.9368)
  arc A118 (710.5775, -94.9368) -> (716, -91.1982) centre (712, -91.1982) ccw
  line L404 (716, -91.1982) -> (716, -82)
  line L405 (716, -82) -> (713, -82)
  line L406 (713, -82) -> (713, -67)
  line L407 (713, -67) -> (692.5332, -67)
  line L408 (692.5332, -67) -> (692.5332, -64)
  line L409 (692.5332, -64) -> (716, -64)
  line L410 (716, -64) -> (716, -34.5)
  line L411 (716, -34.5) -> (713, -34.5)
  line L412 (713, -34.5) -> (713, -19.5)
  line L413 (713, -19.5) -> (716, -19.5)
  line L414 (716, -19.5) -> (716, 10)
  line L415 (716, 10) -> (692.5332, 10)
  line L416 (692.5332, 10) -> (692.5332, 13)
  point P0 (0, 0)
  point P1 (461.0632, -21.5795)
  point P2 (593.1982, -27.002)
  point P3 (576.0715, 33.2574)
  point P4 (548.1018, 34.0716)
  point P5 (509.8984, 34.0712)
  point P6 (481.9285, 33.2574)
  point P7 (506, -5.002)
  point P8 (506, 22.998)
  point P9 (512, -5.002)
  point P10 (552, -5.002)
extrude "Extrusion2" add sketch "Sketch2" along normal blind 3 contours L317 L318 L319 L320 L321 L322 L323 L324 L325 L326 L327 L328 L329 L330 L331 L332 L333 L334 L335 L336
properties part number "soporte_base"
